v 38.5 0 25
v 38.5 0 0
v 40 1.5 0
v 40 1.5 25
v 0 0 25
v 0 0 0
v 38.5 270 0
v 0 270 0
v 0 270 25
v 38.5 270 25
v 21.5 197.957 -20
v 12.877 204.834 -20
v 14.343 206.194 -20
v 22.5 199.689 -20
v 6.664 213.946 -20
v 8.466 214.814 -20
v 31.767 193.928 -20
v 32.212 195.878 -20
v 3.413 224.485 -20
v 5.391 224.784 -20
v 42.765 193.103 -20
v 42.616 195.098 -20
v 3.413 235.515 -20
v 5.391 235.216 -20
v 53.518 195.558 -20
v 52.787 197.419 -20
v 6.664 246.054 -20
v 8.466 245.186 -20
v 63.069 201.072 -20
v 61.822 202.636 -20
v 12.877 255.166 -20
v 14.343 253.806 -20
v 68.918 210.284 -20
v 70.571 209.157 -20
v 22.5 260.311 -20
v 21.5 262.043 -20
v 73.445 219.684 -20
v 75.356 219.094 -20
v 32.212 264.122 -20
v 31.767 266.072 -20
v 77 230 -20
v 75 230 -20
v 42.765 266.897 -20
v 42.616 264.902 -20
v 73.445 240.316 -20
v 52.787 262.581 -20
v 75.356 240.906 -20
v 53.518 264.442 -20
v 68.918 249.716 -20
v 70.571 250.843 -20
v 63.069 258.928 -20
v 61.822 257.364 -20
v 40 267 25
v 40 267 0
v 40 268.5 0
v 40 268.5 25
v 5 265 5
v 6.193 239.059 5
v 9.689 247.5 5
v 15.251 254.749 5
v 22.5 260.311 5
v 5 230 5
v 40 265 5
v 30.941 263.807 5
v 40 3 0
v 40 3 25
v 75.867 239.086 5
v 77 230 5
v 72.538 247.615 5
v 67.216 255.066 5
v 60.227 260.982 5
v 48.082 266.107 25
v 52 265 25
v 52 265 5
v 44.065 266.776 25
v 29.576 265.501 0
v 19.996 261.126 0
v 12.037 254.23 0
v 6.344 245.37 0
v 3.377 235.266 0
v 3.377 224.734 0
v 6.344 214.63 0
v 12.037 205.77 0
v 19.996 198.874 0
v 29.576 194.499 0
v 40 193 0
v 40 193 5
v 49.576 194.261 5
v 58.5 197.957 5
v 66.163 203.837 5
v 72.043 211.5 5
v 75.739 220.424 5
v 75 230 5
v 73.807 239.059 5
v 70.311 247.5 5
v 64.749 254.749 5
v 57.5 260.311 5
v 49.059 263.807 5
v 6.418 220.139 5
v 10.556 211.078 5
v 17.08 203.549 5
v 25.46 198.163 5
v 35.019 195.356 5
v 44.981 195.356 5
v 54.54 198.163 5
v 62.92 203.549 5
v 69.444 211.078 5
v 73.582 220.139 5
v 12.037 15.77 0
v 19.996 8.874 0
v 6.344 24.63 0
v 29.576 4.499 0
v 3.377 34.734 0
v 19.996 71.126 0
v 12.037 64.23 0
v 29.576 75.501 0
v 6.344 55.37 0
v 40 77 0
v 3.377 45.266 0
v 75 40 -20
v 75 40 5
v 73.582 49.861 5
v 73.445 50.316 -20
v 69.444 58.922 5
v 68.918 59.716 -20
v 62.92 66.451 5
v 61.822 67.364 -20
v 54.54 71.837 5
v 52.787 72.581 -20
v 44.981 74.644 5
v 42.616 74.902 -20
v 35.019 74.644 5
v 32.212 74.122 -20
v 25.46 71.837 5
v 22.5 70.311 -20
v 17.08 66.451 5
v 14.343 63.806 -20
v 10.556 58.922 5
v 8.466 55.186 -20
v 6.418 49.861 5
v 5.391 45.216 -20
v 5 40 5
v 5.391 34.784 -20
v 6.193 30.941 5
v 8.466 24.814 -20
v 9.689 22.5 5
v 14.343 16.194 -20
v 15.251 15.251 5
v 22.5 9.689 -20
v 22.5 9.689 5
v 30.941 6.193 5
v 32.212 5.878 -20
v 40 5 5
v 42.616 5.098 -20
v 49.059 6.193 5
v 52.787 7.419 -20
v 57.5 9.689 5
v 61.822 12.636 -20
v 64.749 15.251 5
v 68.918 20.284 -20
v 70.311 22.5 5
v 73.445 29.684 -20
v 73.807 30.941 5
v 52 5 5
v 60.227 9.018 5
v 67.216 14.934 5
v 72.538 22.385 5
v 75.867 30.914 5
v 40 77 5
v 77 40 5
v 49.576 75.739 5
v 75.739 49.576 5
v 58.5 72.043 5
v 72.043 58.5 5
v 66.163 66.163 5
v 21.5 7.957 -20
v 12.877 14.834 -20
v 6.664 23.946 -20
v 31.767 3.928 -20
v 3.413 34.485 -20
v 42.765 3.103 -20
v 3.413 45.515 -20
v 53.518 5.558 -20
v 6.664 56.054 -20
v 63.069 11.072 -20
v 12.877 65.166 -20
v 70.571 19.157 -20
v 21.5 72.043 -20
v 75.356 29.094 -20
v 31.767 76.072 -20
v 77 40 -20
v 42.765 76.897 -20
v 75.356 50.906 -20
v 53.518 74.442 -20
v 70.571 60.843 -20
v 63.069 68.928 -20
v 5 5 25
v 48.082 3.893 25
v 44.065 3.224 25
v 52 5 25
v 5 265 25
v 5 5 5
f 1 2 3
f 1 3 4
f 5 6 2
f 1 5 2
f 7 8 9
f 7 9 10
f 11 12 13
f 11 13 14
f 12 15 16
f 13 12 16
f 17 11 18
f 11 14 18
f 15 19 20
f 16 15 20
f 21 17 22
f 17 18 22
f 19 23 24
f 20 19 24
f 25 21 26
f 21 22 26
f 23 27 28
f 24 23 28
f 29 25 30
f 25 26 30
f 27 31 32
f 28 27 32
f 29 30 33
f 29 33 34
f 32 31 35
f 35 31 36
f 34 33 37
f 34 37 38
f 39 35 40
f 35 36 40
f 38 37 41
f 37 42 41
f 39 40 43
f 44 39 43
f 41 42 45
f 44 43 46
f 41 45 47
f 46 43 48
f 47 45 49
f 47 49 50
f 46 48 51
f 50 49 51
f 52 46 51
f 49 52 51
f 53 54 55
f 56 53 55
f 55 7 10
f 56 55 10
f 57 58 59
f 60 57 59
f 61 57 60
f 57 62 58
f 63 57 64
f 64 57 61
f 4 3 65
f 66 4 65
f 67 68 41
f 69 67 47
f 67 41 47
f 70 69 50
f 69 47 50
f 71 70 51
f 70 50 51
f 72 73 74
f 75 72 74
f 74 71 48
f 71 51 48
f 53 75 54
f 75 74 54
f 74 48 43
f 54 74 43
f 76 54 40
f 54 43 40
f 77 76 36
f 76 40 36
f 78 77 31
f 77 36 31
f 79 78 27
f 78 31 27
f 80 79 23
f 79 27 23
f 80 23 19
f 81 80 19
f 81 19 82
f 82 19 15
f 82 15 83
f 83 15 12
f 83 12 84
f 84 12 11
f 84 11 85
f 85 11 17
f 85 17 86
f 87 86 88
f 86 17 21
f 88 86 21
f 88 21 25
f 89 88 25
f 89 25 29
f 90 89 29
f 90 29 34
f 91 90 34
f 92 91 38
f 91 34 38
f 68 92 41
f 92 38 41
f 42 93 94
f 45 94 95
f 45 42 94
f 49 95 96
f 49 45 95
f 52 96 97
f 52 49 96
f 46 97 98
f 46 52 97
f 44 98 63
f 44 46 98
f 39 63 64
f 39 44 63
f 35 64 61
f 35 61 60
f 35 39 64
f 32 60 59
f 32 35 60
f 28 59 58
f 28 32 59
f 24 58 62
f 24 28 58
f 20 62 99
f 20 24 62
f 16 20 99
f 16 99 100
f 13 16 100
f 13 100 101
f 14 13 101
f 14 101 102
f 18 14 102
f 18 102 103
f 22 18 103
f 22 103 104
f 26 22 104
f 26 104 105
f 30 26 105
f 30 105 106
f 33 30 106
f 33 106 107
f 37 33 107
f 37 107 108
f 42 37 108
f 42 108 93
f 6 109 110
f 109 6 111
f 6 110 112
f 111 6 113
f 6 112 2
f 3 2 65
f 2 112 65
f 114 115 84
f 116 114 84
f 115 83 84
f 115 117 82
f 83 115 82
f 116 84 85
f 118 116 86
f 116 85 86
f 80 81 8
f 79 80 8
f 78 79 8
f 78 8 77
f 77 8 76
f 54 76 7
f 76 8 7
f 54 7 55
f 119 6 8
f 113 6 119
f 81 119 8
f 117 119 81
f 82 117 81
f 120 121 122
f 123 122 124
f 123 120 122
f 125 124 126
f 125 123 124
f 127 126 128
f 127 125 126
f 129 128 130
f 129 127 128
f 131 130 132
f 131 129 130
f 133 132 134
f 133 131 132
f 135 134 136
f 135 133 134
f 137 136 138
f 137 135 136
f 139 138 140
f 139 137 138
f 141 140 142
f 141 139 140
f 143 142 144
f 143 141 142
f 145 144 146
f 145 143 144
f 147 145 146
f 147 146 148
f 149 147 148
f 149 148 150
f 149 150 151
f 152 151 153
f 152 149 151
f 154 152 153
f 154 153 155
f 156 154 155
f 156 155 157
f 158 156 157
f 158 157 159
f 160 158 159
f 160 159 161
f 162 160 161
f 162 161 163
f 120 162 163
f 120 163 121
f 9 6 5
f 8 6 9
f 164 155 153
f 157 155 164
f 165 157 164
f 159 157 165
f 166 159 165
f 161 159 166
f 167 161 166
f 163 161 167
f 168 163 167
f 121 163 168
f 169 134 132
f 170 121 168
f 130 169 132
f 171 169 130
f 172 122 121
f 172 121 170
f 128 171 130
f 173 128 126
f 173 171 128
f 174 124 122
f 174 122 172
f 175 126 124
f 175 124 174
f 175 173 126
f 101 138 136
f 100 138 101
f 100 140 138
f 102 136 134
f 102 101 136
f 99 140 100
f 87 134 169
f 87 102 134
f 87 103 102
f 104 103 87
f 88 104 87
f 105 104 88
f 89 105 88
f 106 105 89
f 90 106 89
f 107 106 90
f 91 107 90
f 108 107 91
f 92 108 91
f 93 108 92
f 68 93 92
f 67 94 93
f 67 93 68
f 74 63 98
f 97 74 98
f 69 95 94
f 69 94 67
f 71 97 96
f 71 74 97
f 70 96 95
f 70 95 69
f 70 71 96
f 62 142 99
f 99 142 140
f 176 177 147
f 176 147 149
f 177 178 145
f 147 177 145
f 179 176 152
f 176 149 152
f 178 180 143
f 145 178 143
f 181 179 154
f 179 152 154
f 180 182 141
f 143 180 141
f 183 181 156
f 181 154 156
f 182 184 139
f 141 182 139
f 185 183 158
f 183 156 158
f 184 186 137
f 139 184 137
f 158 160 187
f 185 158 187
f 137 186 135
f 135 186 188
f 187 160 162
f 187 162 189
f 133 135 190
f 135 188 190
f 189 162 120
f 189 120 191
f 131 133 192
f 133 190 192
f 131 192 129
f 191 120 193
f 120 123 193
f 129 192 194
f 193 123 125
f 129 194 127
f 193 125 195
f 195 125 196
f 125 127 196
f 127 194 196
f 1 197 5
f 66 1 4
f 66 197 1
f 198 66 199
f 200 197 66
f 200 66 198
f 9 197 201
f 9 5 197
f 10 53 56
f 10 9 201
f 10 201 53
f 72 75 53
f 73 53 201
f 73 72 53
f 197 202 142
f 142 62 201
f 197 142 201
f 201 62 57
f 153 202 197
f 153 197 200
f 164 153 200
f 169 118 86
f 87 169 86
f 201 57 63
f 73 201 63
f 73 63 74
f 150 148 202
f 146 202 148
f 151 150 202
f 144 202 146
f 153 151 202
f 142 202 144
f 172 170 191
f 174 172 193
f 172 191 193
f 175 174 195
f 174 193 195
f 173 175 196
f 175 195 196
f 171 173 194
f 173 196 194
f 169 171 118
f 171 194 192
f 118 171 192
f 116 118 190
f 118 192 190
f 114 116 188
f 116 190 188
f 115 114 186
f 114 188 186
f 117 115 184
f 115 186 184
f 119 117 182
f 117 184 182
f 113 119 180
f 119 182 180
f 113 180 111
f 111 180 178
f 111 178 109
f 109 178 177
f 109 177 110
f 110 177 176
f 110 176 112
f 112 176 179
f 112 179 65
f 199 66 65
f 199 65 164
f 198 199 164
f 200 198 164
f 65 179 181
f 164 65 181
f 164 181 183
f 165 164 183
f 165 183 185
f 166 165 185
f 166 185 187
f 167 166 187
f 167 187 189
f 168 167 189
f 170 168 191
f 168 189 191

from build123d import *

# Parameters (mm, degrees)
CYLINDER002_R     = 35
CYLINDER002_DEPTH = 50
CYLINDER001_R     = 35
CYLINDER001_DEPTH = 50
BOX001_W          = 102
BOX001_H          = 260
BOX001_DEPTH      = 50
CYLINDER_R        = 37
CYLINDER_DEPTH    = 45
CYLINDER003_R     = 37
CYLINDER003_DEPTH = 45
BOX_W             = 40
BOX_H             = 270
BOX_DEPTH         = 25
CHAMFER_SIZE      = 1.5


with BuildPart() as cylinder002:
    # Cylinder002 → Cylinder002 (new body)
    with BuildSketch(Plane(origin=(40, 230, -45), x_dir=(1, 0, 0), z_dir=(0, 0, 1))):
        Circle(CYLINDER002_R)
    extrude(amount=CYLINDER002_DEPTH)


with BuildPart() as cylinder001:
    # Cylinder001 → Cylinder001 (new body)
    with BuildSketch(Plane(origin=(40, 40, -45), x_dir=(1, 0, 0), z_dir=(0, 0, 1))):
        Circle(CYLINDER001_R)
    extrude(amount=CYLINDER001_DEPTH)


with BuildPart() as main_cutout:
    # Box001 → Box001 (new body)
    with BuildSketch(Plane(origin=(5, 5, 5), x_dir=(1, 0, 0), z_dir=(0, 0, 1))):
        with Locations((51, 130)):
            Rectangle(BOX001_W, BOX001_H)
    extrude(amount=BOX001_DEPTH)


with BuildPart() as cylinder:
    # Cylinder → Cylinder (new body)
    with BuildSketch(Plane(origin=(40, 40, -20), x_dir=(1, 0, 0), z_dir=(0, 0, 1))):
        Circle(CYLINDER_R)
    extrude(amount=CYLINDER_DEPTH)


with BuildPart() as cylinder003:
    # Cylinder003 → Cylinder003 (new body)
    with BuildSketch(Plane(origin=(40, 230, -20), x_dir=(1, 0, 0), z_dir=(0, 0, 1))):
        Circle(CYLINDER003_R)
    extrude(amount=CYLINDER003_DEPTH)


with BuildPart() as chamfer_body:
    # Box → Box (new body)
    with BuildSketch(Plane.XY):
        with Locations((20, 135)):
            Rectangle(BOX_W, BOX_H)
    extrude(amount=BOX_DEPTH)

    # Fusion: union Cylinder, Cylinder003
    add(cylinder.part)
    add(cylinder003.part)

    # Cut: cut Main cutout
    add(main_cutout.part, mode=Mode.SUBTRACT)

    # Cut001: cut Cylinder001
    add(cylinder001.part, mode=Mode.SUBTRACT)

    # Cut002: cut Cylinder002
    add(cylinder002.part, mode=Mode.SUBTRACT)

    # Chamfer
    chamfer_edges = [chamfer_body.edges().sort_by_distance(p)[0] for p in [
        (40, 0, 12.5),
        (40, 270, 12.5),
    ]]
    chamfer(chamfer_edges, length=CHAMFER_SIZE)


solid = chamfer_body.part
